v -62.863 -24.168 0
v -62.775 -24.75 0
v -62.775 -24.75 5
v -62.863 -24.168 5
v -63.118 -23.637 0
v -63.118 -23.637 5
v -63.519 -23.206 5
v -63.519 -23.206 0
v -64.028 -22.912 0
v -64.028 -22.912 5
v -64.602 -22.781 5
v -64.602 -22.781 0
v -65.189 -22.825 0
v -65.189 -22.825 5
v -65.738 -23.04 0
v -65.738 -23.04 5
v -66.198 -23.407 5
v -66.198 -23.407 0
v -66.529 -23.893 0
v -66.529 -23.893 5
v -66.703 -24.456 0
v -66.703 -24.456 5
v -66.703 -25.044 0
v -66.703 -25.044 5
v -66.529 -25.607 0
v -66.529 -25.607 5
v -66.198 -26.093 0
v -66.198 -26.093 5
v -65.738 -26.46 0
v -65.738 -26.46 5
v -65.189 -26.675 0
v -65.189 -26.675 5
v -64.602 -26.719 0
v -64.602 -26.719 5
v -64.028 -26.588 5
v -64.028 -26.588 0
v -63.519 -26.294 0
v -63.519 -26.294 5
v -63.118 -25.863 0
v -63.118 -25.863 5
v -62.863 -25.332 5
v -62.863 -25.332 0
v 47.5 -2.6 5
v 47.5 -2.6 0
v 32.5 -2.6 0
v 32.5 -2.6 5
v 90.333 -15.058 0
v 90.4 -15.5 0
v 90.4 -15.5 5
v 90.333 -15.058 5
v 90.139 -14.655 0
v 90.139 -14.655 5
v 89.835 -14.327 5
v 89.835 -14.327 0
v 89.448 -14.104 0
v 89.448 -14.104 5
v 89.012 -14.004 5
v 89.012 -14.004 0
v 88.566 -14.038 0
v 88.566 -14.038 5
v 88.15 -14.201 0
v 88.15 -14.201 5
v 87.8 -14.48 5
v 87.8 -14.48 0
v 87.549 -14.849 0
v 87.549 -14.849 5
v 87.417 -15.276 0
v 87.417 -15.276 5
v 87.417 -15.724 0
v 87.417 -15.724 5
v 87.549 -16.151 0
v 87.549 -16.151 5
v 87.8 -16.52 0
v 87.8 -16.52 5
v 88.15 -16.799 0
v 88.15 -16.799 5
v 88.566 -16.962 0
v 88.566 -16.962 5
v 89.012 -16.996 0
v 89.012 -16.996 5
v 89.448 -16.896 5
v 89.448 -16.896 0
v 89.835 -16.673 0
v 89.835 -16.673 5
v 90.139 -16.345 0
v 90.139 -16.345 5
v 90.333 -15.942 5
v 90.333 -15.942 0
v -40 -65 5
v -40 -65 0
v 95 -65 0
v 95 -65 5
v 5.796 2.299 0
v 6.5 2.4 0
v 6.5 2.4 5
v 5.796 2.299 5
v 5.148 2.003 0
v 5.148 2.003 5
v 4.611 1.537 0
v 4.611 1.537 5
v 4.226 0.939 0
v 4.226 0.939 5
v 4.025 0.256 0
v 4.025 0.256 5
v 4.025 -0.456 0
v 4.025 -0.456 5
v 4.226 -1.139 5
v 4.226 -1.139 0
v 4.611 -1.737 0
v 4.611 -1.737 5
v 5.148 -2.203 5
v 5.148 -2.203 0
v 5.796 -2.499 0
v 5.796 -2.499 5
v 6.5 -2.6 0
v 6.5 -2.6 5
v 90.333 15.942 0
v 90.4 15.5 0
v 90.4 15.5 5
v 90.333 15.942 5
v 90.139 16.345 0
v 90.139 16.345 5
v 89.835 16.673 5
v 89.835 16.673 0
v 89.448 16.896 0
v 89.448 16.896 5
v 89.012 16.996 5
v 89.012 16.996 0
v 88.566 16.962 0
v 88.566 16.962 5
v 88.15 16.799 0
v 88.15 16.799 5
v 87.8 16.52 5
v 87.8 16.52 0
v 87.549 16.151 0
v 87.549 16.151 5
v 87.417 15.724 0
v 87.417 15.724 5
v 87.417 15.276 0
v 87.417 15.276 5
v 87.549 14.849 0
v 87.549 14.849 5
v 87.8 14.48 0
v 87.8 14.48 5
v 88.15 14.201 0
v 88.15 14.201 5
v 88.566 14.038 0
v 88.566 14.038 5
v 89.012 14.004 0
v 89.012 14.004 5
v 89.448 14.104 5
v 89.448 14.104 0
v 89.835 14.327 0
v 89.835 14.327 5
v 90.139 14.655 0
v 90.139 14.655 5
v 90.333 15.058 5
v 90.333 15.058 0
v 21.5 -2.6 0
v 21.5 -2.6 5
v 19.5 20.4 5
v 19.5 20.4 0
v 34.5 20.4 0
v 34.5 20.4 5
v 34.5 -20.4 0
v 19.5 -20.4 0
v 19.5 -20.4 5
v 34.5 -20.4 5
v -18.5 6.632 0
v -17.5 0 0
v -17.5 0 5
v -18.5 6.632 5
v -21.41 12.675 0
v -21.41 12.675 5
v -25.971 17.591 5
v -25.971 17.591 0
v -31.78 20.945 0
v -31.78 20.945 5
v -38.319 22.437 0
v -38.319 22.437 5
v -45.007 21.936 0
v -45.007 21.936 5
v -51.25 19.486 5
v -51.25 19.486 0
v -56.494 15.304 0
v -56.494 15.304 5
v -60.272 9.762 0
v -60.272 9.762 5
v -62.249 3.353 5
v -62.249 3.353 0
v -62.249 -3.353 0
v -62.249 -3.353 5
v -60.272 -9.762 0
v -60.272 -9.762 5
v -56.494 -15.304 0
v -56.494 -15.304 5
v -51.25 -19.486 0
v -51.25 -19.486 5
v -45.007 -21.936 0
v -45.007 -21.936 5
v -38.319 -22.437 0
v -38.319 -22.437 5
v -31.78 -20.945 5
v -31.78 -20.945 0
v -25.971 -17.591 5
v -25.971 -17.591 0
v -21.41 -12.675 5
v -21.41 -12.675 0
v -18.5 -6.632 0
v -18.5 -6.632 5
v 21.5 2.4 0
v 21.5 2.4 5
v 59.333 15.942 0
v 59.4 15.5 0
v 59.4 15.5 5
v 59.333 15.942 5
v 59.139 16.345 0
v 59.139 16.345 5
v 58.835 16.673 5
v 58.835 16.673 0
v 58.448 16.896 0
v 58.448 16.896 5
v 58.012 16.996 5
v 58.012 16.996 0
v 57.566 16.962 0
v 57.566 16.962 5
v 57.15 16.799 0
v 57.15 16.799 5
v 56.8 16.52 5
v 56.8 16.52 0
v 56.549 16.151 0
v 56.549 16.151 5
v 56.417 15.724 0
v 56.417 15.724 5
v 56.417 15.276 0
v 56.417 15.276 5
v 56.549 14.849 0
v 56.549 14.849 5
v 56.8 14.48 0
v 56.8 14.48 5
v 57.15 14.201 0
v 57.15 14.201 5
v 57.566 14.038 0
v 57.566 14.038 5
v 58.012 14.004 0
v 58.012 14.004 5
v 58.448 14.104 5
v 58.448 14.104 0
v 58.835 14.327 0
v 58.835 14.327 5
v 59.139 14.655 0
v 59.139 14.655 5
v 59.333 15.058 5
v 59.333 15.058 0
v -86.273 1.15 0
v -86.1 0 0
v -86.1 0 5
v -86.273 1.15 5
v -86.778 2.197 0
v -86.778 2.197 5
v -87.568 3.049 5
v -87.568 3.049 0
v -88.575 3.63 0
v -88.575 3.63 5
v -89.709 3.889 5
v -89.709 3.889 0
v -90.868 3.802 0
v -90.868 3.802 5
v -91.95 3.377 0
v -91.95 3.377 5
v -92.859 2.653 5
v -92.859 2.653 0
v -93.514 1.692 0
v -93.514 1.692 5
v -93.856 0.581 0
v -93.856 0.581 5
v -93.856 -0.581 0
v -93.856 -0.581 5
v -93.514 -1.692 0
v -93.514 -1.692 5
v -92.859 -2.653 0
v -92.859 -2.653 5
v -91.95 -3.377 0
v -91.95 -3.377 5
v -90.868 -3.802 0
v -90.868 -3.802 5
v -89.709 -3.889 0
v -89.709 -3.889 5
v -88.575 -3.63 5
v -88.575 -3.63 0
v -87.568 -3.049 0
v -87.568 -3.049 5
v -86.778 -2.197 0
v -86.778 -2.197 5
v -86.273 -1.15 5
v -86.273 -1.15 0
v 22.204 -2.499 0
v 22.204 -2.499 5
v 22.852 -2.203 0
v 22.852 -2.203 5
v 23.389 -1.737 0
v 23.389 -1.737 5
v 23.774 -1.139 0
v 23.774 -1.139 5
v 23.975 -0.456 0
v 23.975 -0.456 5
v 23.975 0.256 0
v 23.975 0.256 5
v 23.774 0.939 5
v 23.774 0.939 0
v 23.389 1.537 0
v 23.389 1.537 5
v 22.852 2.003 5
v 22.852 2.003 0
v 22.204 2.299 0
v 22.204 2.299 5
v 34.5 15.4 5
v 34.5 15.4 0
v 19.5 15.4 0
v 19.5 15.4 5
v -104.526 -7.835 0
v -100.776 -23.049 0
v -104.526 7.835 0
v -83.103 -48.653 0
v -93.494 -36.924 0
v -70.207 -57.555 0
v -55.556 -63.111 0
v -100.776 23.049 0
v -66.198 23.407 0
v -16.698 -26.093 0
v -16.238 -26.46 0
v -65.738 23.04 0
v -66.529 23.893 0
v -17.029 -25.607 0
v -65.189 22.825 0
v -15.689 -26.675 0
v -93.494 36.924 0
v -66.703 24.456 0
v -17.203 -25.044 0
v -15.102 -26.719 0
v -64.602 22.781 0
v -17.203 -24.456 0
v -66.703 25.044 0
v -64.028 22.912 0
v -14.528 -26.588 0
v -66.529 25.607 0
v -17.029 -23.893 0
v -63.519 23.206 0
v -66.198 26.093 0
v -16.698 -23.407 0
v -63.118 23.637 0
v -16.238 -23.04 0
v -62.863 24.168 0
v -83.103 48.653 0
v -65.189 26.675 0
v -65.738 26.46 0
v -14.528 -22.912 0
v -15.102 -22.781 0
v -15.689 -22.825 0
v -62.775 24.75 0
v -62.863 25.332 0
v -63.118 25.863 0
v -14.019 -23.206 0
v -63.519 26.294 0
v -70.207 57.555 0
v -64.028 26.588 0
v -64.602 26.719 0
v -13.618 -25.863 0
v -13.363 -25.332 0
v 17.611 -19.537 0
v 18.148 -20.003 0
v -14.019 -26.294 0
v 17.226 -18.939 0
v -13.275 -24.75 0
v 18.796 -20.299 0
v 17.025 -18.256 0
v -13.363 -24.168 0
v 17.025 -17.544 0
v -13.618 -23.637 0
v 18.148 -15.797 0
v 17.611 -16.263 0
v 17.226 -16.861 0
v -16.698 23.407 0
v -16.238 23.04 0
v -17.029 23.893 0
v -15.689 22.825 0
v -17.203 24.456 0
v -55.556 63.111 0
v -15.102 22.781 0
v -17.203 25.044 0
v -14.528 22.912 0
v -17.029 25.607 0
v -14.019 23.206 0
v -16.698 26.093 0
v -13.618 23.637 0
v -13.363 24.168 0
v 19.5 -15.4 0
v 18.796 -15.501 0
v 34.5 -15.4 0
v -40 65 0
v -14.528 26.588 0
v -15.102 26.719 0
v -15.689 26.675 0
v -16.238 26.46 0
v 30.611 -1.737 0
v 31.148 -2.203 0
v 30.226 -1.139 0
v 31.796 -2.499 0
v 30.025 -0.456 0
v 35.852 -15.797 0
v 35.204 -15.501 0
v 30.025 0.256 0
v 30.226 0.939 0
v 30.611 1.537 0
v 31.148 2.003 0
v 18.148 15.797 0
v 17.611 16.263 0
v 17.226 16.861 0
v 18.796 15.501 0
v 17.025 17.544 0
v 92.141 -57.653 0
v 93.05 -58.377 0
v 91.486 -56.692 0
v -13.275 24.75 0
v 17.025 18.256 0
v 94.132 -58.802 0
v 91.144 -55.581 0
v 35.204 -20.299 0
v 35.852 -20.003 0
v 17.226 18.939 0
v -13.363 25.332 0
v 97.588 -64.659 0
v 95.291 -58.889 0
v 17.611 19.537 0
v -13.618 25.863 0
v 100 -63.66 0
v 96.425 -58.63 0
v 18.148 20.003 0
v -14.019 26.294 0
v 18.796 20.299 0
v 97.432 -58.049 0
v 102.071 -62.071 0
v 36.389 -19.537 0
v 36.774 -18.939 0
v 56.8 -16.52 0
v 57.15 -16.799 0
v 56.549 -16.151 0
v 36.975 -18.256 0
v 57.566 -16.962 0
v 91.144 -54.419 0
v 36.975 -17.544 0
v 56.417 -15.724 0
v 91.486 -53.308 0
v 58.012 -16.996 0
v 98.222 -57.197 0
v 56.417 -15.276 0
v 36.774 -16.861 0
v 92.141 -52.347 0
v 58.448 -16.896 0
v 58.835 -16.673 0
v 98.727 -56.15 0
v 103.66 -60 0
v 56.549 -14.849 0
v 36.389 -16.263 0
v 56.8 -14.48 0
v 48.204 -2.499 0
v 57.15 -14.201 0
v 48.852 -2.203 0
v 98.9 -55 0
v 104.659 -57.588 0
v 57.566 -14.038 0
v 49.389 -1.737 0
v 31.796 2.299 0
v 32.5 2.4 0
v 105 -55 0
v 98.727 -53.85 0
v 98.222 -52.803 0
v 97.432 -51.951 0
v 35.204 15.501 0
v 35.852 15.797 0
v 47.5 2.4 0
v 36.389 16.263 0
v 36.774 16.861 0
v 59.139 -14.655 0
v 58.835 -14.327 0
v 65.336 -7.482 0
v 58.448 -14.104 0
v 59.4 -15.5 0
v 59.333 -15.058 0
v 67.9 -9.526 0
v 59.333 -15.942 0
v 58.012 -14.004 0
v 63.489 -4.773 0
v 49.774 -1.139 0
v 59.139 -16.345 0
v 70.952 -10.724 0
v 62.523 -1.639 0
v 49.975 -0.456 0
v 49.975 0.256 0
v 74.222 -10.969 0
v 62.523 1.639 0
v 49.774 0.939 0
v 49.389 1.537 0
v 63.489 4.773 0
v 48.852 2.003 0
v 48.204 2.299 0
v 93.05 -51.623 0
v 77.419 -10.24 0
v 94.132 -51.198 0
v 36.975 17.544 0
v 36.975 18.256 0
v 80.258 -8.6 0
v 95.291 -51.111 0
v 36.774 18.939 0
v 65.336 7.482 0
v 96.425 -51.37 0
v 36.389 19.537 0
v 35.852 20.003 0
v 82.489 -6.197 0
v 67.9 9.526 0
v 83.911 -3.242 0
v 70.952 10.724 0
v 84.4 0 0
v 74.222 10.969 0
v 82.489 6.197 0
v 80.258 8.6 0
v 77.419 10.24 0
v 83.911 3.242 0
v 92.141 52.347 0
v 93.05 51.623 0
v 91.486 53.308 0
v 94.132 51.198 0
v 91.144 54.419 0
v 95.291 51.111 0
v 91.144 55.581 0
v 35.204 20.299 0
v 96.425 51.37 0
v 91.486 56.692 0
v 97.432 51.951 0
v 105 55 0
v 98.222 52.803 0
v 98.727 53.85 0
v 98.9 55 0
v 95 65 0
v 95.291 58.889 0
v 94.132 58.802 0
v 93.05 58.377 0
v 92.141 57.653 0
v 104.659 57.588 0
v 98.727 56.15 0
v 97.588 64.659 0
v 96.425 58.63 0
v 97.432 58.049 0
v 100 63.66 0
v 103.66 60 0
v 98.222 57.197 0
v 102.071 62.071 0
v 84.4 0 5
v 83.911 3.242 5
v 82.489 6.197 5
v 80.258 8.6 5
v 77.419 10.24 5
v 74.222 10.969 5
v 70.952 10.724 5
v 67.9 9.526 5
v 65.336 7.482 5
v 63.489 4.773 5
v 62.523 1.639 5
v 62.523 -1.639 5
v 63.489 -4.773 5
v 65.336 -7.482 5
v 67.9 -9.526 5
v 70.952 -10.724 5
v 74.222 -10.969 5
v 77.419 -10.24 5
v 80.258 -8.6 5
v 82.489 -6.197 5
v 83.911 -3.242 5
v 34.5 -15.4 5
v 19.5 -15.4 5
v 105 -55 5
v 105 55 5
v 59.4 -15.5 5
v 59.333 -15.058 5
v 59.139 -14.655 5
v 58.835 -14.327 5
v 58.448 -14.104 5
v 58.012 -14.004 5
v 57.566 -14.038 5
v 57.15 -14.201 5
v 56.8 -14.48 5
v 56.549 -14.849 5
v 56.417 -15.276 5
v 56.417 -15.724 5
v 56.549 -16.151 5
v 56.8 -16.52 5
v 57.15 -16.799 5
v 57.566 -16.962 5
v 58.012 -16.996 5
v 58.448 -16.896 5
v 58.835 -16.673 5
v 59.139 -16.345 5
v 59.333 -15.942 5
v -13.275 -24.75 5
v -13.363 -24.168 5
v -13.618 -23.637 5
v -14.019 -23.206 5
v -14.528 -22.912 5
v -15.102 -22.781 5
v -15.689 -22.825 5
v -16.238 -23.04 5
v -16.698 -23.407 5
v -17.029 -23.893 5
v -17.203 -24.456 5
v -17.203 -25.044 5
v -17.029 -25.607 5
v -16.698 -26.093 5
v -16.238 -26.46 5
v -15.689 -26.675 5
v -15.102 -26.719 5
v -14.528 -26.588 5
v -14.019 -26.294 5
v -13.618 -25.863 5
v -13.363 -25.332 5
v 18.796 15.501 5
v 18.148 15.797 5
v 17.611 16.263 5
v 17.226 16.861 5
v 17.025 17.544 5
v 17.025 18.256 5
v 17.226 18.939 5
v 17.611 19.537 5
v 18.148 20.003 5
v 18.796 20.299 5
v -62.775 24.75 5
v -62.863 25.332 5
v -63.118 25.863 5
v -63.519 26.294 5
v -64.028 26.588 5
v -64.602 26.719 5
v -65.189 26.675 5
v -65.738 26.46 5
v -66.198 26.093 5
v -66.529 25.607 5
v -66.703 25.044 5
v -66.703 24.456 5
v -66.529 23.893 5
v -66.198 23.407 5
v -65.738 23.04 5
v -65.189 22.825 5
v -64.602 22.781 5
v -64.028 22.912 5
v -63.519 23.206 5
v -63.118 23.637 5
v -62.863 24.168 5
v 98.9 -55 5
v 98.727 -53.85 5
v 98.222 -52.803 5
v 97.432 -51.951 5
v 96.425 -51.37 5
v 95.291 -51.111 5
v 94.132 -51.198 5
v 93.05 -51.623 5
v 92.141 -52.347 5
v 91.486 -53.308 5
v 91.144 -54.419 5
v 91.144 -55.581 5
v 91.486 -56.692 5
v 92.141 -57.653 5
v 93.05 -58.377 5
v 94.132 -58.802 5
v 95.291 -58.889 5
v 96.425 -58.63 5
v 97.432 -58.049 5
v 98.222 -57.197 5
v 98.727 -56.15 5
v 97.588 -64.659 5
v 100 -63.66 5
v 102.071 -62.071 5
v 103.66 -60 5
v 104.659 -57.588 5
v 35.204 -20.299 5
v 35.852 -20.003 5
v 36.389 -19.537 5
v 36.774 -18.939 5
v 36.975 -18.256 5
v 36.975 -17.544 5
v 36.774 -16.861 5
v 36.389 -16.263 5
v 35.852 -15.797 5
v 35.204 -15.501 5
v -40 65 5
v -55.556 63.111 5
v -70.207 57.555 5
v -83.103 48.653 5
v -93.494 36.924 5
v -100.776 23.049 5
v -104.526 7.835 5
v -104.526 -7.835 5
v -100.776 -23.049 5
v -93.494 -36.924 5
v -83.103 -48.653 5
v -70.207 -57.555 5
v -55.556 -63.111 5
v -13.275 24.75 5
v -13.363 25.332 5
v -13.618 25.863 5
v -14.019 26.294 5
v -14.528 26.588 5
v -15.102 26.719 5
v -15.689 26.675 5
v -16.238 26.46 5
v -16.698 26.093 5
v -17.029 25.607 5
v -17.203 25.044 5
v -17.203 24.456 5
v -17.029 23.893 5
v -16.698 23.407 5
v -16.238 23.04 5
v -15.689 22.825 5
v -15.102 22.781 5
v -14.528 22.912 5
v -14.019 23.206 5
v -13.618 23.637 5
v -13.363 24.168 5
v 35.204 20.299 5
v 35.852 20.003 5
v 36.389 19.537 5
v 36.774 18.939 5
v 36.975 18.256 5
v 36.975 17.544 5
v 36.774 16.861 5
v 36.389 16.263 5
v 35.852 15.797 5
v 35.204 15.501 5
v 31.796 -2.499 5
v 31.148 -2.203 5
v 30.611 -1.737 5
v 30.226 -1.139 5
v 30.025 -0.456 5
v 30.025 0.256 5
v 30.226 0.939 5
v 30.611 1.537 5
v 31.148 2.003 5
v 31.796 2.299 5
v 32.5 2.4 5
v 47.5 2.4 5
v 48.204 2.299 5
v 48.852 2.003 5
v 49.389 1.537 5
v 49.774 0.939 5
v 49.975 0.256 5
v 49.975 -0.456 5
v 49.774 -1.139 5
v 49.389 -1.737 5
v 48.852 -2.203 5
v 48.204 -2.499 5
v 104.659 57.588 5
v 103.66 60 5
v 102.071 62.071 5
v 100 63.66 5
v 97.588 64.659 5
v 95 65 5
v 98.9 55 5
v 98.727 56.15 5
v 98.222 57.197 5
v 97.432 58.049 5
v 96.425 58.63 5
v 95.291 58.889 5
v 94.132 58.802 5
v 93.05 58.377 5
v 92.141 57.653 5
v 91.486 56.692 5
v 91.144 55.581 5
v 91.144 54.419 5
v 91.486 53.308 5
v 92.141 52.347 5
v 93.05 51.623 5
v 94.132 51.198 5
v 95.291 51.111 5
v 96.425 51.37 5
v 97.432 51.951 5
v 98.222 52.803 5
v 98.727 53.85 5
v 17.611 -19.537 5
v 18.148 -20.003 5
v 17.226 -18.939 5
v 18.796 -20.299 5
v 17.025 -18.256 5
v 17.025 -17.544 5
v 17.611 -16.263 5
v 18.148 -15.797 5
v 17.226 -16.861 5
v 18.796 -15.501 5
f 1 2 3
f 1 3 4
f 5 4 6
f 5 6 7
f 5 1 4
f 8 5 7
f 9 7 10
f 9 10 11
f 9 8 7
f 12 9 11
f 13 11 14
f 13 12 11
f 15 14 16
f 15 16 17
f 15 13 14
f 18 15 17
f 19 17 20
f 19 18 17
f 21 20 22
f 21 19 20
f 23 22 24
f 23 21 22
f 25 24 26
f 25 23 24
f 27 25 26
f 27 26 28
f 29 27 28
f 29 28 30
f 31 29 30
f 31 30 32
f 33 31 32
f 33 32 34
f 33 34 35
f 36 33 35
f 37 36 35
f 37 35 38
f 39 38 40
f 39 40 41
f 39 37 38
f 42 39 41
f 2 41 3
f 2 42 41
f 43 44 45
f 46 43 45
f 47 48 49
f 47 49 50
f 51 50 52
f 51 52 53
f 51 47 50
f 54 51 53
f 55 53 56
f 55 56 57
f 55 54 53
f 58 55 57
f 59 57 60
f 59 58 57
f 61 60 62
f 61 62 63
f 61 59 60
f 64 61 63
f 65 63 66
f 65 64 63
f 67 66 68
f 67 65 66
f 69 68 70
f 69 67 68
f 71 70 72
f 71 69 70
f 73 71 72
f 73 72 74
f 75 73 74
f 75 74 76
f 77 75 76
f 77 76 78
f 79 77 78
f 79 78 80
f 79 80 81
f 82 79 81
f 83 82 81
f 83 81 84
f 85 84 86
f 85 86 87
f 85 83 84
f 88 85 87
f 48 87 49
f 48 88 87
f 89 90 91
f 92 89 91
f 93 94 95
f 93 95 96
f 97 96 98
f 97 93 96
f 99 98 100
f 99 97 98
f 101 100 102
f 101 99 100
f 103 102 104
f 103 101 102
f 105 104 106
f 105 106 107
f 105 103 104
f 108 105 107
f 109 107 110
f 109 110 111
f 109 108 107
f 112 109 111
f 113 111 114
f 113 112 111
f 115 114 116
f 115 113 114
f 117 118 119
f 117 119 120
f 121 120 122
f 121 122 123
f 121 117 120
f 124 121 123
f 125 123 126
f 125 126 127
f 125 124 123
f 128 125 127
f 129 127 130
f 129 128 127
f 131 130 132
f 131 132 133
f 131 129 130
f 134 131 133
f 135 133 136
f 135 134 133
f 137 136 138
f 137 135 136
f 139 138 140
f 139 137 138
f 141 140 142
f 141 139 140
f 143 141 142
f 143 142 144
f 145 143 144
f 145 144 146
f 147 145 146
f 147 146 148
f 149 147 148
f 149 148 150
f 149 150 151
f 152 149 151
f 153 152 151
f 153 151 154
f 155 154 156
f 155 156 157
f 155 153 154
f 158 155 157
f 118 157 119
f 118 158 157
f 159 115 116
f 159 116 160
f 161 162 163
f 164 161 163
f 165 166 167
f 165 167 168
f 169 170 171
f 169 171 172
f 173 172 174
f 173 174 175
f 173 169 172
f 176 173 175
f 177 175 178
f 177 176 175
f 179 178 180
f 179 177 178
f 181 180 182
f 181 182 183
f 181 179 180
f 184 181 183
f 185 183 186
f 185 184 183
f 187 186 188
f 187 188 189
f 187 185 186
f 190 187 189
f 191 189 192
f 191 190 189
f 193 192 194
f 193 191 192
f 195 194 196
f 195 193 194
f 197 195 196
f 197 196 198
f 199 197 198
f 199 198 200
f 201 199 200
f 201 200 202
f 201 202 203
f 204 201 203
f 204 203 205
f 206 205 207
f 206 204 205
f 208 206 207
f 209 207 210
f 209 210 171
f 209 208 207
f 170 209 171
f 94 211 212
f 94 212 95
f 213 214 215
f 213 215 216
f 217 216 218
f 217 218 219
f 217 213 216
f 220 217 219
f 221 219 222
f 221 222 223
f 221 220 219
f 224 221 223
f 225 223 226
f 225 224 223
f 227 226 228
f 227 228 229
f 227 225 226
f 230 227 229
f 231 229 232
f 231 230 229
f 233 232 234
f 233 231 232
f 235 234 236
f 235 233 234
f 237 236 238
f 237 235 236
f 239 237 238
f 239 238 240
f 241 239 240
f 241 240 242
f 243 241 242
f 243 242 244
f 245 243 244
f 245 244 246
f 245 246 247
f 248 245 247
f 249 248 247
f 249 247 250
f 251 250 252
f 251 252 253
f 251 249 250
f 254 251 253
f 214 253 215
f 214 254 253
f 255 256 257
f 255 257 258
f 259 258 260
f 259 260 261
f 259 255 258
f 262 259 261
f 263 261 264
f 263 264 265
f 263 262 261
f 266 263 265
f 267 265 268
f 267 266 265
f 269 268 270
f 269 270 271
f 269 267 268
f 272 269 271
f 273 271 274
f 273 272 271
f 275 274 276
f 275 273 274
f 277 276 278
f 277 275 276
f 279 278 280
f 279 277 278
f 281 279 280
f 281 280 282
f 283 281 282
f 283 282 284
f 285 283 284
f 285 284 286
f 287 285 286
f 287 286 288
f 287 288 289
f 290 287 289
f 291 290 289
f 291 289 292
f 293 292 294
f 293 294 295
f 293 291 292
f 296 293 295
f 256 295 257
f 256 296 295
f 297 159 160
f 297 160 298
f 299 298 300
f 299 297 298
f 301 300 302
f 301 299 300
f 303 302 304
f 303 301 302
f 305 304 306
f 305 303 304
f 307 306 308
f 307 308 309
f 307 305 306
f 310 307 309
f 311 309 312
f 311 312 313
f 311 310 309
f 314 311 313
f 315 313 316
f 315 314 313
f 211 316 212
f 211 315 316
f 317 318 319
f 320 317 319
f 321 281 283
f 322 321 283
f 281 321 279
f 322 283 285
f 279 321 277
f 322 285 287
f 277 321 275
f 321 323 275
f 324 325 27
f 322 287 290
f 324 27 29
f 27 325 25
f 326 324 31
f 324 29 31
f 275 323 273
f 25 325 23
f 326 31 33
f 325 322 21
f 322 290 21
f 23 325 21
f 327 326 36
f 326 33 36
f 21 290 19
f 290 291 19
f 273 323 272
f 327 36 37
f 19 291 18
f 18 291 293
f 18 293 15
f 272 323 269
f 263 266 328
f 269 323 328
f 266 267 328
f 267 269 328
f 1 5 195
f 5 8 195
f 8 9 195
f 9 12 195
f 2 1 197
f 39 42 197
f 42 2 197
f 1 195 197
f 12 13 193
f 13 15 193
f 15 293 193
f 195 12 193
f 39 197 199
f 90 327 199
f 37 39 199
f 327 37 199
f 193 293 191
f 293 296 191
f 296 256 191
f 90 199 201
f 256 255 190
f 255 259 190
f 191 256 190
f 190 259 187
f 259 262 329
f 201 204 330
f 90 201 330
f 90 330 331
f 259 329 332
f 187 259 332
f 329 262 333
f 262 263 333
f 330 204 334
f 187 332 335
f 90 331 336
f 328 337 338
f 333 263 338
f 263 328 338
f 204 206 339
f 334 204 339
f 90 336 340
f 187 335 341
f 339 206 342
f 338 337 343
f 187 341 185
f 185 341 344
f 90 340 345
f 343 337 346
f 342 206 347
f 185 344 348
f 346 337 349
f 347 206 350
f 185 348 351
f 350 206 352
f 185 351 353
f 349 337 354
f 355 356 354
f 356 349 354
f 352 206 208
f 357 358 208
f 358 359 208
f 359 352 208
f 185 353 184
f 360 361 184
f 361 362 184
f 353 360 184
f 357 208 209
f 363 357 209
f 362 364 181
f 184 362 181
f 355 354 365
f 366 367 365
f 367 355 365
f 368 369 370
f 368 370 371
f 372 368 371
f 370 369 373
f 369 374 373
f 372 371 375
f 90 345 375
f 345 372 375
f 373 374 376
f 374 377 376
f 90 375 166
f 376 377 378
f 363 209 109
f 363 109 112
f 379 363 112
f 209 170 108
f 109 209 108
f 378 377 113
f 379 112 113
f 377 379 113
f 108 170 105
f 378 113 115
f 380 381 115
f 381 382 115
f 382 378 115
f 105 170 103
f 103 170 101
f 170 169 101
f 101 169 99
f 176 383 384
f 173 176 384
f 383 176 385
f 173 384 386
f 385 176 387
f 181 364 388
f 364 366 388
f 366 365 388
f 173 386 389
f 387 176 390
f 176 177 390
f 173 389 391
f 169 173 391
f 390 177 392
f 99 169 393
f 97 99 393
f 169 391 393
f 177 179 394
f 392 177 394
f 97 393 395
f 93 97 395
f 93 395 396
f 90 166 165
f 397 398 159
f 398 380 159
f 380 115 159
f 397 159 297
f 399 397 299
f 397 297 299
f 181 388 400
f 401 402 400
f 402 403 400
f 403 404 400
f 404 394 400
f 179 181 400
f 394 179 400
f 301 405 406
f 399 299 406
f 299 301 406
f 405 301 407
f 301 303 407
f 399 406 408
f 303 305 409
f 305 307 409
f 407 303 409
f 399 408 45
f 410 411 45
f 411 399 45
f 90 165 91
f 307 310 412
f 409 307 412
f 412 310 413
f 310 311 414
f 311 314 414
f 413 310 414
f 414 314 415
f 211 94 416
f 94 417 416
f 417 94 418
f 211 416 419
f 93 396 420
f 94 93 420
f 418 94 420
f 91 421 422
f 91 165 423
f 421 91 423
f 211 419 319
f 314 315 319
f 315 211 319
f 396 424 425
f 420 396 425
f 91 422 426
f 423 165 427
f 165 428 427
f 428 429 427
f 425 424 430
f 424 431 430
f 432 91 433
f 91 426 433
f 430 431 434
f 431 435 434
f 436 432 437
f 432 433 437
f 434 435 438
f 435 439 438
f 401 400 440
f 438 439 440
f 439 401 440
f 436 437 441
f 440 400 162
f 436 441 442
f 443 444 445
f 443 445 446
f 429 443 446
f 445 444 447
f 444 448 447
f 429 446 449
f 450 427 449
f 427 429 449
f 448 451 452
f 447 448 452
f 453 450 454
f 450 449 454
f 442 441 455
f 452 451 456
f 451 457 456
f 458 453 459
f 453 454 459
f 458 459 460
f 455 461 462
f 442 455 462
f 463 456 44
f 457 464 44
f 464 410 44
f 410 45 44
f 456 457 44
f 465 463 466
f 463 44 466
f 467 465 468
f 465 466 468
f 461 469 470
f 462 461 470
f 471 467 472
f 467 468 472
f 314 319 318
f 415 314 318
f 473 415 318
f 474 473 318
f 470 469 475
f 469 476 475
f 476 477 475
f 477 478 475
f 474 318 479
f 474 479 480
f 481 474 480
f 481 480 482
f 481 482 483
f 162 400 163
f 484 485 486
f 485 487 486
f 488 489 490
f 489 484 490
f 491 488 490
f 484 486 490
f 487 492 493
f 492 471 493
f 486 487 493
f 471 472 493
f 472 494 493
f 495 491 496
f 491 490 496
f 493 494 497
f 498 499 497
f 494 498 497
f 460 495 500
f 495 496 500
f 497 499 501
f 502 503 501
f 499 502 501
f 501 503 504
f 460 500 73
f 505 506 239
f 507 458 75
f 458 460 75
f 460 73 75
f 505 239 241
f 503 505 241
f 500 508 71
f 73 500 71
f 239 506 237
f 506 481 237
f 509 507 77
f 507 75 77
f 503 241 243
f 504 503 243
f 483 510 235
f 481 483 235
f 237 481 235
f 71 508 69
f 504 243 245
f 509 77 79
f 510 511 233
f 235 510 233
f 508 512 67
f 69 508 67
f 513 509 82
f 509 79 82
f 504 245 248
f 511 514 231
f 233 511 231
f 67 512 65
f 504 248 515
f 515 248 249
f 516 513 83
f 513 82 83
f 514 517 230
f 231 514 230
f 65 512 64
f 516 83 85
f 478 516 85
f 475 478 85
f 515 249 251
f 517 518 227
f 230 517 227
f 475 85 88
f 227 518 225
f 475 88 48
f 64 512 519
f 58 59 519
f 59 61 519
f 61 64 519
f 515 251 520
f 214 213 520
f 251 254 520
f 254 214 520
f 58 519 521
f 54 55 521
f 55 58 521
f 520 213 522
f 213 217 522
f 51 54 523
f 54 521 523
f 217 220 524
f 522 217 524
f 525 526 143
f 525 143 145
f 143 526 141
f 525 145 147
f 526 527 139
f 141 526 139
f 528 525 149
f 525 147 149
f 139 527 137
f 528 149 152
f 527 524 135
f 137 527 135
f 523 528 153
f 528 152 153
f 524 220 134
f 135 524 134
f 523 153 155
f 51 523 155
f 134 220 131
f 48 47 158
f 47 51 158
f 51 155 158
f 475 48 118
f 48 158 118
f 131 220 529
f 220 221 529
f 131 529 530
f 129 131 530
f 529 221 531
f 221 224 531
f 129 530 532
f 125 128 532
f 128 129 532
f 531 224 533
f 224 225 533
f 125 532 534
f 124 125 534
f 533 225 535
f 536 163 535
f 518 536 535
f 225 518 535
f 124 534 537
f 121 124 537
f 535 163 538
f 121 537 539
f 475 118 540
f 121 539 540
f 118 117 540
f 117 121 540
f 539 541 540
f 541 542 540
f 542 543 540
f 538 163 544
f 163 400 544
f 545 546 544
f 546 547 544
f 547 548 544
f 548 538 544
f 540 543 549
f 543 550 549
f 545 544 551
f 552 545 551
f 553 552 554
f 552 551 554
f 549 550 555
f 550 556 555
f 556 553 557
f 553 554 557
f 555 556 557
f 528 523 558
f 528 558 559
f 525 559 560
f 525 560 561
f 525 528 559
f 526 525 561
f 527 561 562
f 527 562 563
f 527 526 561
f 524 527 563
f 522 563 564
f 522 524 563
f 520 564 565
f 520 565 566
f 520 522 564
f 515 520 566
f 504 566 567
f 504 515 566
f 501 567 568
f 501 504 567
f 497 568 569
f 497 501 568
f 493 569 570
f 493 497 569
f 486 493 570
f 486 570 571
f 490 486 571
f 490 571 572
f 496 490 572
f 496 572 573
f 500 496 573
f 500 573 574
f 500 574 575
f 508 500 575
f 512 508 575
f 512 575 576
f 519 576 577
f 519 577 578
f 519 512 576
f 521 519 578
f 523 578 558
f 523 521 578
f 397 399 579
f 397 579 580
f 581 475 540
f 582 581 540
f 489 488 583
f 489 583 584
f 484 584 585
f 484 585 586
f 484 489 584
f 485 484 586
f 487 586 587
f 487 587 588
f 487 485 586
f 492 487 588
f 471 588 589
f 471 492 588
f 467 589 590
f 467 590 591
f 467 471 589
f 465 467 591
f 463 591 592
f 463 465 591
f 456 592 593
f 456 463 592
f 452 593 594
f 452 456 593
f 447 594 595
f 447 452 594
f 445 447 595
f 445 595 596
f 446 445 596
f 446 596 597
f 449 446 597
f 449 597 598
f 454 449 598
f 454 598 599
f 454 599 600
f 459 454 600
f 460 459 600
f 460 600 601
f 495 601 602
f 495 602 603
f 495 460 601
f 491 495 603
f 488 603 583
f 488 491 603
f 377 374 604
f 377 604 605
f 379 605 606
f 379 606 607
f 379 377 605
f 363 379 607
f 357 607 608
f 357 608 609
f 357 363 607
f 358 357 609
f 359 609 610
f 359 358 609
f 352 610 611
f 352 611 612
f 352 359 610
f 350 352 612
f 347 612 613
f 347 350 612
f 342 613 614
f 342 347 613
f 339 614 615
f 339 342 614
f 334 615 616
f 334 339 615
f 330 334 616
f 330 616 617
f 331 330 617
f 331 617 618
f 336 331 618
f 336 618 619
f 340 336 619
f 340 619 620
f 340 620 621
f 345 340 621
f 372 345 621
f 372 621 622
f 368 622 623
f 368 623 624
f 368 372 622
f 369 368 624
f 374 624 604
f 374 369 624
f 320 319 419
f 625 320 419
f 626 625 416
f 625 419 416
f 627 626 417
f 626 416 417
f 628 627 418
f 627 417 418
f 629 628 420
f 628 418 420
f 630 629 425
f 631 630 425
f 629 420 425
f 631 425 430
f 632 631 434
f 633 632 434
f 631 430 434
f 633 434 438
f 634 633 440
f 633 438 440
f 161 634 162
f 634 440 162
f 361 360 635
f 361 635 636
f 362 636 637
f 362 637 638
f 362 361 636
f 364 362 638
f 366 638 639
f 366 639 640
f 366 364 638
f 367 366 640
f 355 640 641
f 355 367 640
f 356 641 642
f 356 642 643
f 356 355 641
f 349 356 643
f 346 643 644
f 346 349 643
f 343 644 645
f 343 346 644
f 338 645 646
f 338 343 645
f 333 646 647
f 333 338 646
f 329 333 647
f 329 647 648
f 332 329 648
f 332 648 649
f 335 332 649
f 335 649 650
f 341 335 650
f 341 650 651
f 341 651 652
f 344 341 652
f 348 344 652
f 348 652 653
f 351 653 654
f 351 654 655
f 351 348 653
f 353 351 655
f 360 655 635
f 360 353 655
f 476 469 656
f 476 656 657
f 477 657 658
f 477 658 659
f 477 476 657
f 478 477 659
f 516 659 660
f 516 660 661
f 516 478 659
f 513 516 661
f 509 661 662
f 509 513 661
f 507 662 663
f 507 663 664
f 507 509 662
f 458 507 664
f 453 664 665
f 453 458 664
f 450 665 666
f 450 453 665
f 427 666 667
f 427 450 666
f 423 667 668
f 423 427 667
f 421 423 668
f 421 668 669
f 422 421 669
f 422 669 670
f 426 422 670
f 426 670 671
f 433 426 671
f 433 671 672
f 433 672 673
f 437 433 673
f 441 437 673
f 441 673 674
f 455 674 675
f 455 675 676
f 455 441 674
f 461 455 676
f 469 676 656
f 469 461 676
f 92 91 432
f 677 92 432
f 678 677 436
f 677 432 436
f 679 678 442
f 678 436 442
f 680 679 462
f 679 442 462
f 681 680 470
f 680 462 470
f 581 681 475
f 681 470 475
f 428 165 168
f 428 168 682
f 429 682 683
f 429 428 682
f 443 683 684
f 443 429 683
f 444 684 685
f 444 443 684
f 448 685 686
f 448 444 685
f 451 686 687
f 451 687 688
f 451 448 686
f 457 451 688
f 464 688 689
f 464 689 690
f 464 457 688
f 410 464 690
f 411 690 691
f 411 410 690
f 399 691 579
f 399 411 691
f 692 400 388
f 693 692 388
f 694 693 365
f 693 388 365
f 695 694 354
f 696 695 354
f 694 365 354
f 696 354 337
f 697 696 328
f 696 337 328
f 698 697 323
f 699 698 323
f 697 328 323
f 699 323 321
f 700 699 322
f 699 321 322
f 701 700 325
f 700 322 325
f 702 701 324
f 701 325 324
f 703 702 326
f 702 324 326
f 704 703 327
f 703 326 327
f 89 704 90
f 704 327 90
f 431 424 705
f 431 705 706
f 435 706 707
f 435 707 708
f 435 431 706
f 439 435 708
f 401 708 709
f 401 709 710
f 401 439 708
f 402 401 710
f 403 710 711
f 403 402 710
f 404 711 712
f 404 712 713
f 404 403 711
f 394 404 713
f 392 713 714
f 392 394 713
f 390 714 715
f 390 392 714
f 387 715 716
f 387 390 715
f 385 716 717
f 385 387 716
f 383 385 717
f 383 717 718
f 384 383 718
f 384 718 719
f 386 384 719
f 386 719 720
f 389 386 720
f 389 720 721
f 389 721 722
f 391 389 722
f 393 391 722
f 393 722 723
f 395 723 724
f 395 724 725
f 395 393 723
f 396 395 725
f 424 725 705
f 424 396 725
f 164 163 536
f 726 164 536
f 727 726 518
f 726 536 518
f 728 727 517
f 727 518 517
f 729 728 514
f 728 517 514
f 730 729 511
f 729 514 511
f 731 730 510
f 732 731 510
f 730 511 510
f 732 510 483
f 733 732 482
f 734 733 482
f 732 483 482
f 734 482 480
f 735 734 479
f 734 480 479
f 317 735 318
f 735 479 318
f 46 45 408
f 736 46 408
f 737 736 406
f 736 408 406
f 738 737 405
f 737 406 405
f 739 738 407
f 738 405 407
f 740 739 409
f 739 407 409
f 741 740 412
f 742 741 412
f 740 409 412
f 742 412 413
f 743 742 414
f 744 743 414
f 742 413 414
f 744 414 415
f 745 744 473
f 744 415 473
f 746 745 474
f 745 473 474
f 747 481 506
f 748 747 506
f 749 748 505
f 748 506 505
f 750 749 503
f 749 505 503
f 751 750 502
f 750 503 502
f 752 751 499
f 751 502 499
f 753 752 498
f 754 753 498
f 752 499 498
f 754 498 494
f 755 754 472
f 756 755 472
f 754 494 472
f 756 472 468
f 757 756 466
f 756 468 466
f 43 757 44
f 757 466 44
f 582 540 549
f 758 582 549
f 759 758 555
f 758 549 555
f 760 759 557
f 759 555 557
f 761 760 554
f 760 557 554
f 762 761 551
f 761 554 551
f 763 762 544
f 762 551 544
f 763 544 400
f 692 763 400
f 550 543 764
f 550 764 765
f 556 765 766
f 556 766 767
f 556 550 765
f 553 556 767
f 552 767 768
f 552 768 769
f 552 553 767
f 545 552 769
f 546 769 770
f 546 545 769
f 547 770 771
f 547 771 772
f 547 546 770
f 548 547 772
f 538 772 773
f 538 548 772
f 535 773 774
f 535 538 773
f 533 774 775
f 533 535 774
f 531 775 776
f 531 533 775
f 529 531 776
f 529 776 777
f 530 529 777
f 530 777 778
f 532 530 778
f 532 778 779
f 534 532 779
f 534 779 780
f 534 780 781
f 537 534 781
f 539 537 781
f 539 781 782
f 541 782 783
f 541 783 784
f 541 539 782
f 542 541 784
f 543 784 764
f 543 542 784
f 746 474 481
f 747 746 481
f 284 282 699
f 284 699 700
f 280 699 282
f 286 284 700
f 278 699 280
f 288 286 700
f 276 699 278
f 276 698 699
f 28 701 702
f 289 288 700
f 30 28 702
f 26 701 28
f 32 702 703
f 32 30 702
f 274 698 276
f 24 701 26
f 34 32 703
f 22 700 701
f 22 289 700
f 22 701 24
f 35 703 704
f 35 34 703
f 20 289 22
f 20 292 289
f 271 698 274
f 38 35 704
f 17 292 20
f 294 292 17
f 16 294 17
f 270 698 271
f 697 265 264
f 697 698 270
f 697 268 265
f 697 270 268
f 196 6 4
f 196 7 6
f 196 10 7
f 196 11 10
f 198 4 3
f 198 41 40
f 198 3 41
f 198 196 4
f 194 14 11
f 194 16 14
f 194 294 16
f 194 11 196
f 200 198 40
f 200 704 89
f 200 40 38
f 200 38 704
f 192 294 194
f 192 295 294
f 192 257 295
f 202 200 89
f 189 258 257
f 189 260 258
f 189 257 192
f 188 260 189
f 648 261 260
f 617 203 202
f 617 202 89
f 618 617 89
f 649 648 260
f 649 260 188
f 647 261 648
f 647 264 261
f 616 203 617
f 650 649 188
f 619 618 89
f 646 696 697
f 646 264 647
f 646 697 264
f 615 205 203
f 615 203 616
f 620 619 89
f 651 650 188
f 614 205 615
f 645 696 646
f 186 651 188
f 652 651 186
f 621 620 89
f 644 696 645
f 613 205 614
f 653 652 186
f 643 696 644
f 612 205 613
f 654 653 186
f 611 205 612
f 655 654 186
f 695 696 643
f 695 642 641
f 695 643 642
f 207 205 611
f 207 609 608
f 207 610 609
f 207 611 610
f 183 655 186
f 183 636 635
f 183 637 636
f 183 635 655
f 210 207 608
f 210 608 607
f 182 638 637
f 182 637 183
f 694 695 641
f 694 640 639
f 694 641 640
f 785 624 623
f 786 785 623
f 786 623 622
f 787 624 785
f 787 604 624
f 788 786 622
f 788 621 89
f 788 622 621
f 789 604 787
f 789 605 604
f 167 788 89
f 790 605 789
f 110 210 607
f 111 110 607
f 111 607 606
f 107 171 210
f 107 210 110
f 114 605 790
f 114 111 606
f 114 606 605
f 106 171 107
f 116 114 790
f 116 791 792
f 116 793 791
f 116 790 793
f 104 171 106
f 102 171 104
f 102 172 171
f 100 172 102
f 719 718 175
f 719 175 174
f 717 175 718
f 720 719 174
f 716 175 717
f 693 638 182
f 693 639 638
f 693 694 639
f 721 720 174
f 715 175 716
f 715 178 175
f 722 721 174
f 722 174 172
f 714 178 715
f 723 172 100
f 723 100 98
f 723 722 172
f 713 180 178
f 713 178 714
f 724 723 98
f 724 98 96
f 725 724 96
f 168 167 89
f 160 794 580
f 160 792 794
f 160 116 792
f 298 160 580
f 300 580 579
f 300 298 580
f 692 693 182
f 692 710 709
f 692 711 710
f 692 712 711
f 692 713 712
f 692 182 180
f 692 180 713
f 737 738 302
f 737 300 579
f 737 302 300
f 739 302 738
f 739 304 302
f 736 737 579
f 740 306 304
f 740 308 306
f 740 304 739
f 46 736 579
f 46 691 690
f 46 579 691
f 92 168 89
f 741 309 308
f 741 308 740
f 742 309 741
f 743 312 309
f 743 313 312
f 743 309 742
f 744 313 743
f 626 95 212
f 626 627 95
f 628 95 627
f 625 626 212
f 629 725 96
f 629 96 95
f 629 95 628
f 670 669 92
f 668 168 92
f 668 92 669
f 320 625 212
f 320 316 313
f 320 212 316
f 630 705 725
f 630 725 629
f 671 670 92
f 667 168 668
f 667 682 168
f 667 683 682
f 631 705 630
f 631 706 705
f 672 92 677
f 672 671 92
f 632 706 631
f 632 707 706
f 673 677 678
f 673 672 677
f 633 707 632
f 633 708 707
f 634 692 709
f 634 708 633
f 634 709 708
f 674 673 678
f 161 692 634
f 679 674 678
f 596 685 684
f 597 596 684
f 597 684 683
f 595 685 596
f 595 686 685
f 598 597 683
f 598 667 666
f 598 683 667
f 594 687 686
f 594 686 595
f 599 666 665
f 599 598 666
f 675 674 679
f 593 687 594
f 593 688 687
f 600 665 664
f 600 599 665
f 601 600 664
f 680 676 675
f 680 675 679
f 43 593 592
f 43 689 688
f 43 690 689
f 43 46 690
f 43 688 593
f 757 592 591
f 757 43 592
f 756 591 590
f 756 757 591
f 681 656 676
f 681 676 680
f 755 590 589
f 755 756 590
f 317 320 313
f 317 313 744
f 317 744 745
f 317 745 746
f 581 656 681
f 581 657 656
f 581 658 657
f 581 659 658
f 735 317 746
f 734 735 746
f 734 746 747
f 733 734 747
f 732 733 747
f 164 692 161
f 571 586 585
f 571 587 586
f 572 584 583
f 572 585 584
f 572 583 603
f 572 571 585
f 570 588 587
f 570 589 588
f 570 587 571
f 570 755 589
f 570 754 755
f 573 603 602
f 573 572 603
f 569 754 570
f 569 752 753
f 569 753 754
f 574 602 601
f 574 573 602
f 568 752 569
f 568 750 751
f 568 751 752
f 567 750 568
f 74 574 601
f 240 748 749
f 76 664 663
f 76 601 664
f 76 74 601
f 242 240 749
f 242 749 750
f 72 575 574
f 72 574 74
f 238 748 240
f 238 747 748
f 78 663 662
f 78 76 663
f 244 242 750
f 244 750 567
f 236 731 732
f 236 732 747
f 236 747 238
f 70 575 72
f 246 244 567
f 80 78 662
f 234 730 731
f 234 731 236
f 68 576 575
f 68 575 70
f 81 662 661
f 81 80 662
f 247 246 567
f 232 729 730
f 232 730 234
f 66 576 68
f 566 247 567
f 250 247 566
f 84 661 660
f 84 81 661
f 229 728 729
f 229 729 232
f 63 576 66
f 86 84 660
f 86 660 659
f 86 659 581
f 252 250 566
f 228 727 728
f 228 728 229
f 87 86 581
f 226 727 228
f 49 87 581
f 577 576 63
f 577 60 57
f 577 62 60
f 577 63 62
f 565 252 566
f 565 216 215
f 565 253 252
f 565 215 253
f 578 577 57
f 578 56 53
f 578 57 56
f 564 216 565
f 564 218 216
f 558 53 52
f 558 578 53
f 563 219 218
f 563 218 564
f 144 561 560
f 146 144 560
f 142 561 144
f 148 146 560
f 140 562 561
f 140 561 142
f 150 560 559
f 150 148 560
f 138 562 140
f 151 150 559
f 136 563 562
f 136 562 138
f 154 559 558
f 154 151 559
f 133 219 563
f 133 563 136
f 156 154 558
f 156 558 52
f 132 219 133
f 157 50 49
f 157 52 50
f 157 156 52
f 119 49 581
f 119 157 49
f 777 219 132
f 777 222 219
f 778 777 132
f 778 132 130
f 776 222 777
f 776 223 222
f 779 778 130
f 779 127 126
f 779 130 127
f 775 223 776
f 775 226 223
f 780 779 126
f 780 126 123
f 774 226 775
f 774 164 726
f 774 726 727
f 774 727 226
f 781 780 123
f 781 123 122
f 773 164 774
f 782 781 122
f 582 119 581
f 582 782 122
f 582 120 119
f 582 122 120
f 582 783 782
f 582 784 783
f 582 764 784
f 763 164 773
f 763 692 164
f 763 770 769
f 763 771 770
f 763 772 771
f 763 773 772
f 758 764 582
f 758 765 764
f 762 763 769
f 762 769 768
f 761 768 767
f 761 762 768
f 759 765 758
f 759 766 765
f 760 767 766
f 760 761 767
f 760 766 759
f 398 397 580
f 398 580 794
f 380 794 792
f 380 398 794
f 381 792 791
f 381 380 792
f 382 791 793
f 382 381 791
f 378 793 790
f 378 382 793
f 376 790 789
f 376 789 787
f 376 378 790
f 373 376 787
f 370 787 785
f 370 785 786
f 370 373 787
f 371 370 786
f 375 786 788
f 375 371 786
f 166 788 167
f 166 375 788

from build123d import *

# Parameters (mm, degrees)
SKETCH1_R           = 3.9
SKETCH1_R_2         = 22.5
SKETCH1_R_3         = 1.975
SKETCH1_R_4         = 11
SKETCH1_R_5         = 1.5
BOSS_EXTRUDE3_DEPTH = 5


with BuildPart() as part:
    # Sketch1 → Boss-Extrude3 (new body)
    with BuildSketch(Plane.XY):
        with BuildLine():
            Line((-40, -65), (95, -65))
            ThreePointArc((95, -65), (102.071067812, -62.071067812), (105, -55))
            Line((105, -55), (105, 55))
            ThreePointArc((105, 55), (102.071067812, 62.071067812), (95, 65))
            Line((95, 65), (-40, 65))
            ThreePointArc((-40, 65), (-105, 0), (-40, -65))
        make_face()
        with Locations((95, 55)):
            Circle(SKETCH1_R, mode=Mode.SUBTRACT)
        with Locations((95, -55)):
            Circle(SKETCH1_R, mode=Mode.SUBTRACT)
        with Locations((-90, 0)):
            Circle(SKETCH1_R, mode=Mode.SUBTRACT)
        with Locations((-40, 0)):
            Circle(SKETCH1_R_2, mode=Mode.SUBTRACT)
        with Locations((-64.75, 24.75)):
            Circle(SKETCH1_R_3, mode=Mode.SUBTRACT)
        with Locations((-15.25, 24.75)):
            Circle(SKETCH1_R_3, mode=Mode.SUBTRACT)
        with Locations((-15.25, -24.75)):
            Circle(SKETCH1_R_3, mode=Mode.SUBTRACT)
        with Locations((-64.75, -24.75)):
            Circle(SKETCH1_R_3, mode=Mode.SUBTRACT)
        with Locations((73.4, 0)):
            Circle(SKETCH1_R_4, mode=Mode.SUBTRACT)
        with Locations((57.9, 15.5)):
            Circle(SKETCH1_R_5, mode=Mode.SUBTRACT)
        with Locations((88.9, 15.5)):
            Circle(SKETCH1_R_5, mode=Mode.SUBTRACT)
        with Locations((88.9, -15.5)):
            Circle(SKETCH1_R_5, mode=Mode.SUBTRACT)
        with Locations((57.9, -15.5)):
            Circle(SKETCH1_R_5, mode=Mode.SUBTRACT)
        with BuildLine():
            Line((32.5, 2.4), (47.5, 2.4))
            ThreePointArc((47.5, 2.4), (50, -0.1), (47.5, -2.6))
            Line((47.5, -2.6), (32.5, -2.6))
            ThreePointArc((32.5, -2.6), (30, -0.1), (32.5, 2.4))
        make_face(mode=Mode.SUBTRACT)
        with BuildLine():
            Line((19.5, 20.4), (34.5, 20.4))
            ThreePointArc((34.5, 20.4), (37, 17.9), (34.5, 15.4))
            Line((34.5, 15.4), (19.5, 15.4))
            ThreePointArc((19.5, 15.4), (17, 17.9), (19.5, 20.4))
        make_face(mode=Mode.SUBTRACT)
        with BuildLine():
            Line((21.5, 2.4), (6.5, 2.4))
            ThreePointArc((6.5, 2.4), (4, -0.1), (6.5, -2.6))
            Line((6.5, -2.6), (21.5, -2.6))
            ThreePointArc((21.5, -2.6), (24, -0.1), (21.5, 2.4))
        make_face(mode=Mode.SUBTRACT)
        with BuildLine():
            Line((34.5, -15.4), (19.5, -15.4))
            ThreePointArc((19.5, -15.4), (17, -17.9), (19.5, -20.4))
            Line((19.5, -20.4), (34.5, -20.4))
            ThreePointArc((34.5, -20.4), (37, -17.9), (34.5, -15.4))
        make_face(mode=Mode.SUBTRACT)
    extrude(amount=BOSS_EXTRUDE3_DEPTH)


solid = part.part
